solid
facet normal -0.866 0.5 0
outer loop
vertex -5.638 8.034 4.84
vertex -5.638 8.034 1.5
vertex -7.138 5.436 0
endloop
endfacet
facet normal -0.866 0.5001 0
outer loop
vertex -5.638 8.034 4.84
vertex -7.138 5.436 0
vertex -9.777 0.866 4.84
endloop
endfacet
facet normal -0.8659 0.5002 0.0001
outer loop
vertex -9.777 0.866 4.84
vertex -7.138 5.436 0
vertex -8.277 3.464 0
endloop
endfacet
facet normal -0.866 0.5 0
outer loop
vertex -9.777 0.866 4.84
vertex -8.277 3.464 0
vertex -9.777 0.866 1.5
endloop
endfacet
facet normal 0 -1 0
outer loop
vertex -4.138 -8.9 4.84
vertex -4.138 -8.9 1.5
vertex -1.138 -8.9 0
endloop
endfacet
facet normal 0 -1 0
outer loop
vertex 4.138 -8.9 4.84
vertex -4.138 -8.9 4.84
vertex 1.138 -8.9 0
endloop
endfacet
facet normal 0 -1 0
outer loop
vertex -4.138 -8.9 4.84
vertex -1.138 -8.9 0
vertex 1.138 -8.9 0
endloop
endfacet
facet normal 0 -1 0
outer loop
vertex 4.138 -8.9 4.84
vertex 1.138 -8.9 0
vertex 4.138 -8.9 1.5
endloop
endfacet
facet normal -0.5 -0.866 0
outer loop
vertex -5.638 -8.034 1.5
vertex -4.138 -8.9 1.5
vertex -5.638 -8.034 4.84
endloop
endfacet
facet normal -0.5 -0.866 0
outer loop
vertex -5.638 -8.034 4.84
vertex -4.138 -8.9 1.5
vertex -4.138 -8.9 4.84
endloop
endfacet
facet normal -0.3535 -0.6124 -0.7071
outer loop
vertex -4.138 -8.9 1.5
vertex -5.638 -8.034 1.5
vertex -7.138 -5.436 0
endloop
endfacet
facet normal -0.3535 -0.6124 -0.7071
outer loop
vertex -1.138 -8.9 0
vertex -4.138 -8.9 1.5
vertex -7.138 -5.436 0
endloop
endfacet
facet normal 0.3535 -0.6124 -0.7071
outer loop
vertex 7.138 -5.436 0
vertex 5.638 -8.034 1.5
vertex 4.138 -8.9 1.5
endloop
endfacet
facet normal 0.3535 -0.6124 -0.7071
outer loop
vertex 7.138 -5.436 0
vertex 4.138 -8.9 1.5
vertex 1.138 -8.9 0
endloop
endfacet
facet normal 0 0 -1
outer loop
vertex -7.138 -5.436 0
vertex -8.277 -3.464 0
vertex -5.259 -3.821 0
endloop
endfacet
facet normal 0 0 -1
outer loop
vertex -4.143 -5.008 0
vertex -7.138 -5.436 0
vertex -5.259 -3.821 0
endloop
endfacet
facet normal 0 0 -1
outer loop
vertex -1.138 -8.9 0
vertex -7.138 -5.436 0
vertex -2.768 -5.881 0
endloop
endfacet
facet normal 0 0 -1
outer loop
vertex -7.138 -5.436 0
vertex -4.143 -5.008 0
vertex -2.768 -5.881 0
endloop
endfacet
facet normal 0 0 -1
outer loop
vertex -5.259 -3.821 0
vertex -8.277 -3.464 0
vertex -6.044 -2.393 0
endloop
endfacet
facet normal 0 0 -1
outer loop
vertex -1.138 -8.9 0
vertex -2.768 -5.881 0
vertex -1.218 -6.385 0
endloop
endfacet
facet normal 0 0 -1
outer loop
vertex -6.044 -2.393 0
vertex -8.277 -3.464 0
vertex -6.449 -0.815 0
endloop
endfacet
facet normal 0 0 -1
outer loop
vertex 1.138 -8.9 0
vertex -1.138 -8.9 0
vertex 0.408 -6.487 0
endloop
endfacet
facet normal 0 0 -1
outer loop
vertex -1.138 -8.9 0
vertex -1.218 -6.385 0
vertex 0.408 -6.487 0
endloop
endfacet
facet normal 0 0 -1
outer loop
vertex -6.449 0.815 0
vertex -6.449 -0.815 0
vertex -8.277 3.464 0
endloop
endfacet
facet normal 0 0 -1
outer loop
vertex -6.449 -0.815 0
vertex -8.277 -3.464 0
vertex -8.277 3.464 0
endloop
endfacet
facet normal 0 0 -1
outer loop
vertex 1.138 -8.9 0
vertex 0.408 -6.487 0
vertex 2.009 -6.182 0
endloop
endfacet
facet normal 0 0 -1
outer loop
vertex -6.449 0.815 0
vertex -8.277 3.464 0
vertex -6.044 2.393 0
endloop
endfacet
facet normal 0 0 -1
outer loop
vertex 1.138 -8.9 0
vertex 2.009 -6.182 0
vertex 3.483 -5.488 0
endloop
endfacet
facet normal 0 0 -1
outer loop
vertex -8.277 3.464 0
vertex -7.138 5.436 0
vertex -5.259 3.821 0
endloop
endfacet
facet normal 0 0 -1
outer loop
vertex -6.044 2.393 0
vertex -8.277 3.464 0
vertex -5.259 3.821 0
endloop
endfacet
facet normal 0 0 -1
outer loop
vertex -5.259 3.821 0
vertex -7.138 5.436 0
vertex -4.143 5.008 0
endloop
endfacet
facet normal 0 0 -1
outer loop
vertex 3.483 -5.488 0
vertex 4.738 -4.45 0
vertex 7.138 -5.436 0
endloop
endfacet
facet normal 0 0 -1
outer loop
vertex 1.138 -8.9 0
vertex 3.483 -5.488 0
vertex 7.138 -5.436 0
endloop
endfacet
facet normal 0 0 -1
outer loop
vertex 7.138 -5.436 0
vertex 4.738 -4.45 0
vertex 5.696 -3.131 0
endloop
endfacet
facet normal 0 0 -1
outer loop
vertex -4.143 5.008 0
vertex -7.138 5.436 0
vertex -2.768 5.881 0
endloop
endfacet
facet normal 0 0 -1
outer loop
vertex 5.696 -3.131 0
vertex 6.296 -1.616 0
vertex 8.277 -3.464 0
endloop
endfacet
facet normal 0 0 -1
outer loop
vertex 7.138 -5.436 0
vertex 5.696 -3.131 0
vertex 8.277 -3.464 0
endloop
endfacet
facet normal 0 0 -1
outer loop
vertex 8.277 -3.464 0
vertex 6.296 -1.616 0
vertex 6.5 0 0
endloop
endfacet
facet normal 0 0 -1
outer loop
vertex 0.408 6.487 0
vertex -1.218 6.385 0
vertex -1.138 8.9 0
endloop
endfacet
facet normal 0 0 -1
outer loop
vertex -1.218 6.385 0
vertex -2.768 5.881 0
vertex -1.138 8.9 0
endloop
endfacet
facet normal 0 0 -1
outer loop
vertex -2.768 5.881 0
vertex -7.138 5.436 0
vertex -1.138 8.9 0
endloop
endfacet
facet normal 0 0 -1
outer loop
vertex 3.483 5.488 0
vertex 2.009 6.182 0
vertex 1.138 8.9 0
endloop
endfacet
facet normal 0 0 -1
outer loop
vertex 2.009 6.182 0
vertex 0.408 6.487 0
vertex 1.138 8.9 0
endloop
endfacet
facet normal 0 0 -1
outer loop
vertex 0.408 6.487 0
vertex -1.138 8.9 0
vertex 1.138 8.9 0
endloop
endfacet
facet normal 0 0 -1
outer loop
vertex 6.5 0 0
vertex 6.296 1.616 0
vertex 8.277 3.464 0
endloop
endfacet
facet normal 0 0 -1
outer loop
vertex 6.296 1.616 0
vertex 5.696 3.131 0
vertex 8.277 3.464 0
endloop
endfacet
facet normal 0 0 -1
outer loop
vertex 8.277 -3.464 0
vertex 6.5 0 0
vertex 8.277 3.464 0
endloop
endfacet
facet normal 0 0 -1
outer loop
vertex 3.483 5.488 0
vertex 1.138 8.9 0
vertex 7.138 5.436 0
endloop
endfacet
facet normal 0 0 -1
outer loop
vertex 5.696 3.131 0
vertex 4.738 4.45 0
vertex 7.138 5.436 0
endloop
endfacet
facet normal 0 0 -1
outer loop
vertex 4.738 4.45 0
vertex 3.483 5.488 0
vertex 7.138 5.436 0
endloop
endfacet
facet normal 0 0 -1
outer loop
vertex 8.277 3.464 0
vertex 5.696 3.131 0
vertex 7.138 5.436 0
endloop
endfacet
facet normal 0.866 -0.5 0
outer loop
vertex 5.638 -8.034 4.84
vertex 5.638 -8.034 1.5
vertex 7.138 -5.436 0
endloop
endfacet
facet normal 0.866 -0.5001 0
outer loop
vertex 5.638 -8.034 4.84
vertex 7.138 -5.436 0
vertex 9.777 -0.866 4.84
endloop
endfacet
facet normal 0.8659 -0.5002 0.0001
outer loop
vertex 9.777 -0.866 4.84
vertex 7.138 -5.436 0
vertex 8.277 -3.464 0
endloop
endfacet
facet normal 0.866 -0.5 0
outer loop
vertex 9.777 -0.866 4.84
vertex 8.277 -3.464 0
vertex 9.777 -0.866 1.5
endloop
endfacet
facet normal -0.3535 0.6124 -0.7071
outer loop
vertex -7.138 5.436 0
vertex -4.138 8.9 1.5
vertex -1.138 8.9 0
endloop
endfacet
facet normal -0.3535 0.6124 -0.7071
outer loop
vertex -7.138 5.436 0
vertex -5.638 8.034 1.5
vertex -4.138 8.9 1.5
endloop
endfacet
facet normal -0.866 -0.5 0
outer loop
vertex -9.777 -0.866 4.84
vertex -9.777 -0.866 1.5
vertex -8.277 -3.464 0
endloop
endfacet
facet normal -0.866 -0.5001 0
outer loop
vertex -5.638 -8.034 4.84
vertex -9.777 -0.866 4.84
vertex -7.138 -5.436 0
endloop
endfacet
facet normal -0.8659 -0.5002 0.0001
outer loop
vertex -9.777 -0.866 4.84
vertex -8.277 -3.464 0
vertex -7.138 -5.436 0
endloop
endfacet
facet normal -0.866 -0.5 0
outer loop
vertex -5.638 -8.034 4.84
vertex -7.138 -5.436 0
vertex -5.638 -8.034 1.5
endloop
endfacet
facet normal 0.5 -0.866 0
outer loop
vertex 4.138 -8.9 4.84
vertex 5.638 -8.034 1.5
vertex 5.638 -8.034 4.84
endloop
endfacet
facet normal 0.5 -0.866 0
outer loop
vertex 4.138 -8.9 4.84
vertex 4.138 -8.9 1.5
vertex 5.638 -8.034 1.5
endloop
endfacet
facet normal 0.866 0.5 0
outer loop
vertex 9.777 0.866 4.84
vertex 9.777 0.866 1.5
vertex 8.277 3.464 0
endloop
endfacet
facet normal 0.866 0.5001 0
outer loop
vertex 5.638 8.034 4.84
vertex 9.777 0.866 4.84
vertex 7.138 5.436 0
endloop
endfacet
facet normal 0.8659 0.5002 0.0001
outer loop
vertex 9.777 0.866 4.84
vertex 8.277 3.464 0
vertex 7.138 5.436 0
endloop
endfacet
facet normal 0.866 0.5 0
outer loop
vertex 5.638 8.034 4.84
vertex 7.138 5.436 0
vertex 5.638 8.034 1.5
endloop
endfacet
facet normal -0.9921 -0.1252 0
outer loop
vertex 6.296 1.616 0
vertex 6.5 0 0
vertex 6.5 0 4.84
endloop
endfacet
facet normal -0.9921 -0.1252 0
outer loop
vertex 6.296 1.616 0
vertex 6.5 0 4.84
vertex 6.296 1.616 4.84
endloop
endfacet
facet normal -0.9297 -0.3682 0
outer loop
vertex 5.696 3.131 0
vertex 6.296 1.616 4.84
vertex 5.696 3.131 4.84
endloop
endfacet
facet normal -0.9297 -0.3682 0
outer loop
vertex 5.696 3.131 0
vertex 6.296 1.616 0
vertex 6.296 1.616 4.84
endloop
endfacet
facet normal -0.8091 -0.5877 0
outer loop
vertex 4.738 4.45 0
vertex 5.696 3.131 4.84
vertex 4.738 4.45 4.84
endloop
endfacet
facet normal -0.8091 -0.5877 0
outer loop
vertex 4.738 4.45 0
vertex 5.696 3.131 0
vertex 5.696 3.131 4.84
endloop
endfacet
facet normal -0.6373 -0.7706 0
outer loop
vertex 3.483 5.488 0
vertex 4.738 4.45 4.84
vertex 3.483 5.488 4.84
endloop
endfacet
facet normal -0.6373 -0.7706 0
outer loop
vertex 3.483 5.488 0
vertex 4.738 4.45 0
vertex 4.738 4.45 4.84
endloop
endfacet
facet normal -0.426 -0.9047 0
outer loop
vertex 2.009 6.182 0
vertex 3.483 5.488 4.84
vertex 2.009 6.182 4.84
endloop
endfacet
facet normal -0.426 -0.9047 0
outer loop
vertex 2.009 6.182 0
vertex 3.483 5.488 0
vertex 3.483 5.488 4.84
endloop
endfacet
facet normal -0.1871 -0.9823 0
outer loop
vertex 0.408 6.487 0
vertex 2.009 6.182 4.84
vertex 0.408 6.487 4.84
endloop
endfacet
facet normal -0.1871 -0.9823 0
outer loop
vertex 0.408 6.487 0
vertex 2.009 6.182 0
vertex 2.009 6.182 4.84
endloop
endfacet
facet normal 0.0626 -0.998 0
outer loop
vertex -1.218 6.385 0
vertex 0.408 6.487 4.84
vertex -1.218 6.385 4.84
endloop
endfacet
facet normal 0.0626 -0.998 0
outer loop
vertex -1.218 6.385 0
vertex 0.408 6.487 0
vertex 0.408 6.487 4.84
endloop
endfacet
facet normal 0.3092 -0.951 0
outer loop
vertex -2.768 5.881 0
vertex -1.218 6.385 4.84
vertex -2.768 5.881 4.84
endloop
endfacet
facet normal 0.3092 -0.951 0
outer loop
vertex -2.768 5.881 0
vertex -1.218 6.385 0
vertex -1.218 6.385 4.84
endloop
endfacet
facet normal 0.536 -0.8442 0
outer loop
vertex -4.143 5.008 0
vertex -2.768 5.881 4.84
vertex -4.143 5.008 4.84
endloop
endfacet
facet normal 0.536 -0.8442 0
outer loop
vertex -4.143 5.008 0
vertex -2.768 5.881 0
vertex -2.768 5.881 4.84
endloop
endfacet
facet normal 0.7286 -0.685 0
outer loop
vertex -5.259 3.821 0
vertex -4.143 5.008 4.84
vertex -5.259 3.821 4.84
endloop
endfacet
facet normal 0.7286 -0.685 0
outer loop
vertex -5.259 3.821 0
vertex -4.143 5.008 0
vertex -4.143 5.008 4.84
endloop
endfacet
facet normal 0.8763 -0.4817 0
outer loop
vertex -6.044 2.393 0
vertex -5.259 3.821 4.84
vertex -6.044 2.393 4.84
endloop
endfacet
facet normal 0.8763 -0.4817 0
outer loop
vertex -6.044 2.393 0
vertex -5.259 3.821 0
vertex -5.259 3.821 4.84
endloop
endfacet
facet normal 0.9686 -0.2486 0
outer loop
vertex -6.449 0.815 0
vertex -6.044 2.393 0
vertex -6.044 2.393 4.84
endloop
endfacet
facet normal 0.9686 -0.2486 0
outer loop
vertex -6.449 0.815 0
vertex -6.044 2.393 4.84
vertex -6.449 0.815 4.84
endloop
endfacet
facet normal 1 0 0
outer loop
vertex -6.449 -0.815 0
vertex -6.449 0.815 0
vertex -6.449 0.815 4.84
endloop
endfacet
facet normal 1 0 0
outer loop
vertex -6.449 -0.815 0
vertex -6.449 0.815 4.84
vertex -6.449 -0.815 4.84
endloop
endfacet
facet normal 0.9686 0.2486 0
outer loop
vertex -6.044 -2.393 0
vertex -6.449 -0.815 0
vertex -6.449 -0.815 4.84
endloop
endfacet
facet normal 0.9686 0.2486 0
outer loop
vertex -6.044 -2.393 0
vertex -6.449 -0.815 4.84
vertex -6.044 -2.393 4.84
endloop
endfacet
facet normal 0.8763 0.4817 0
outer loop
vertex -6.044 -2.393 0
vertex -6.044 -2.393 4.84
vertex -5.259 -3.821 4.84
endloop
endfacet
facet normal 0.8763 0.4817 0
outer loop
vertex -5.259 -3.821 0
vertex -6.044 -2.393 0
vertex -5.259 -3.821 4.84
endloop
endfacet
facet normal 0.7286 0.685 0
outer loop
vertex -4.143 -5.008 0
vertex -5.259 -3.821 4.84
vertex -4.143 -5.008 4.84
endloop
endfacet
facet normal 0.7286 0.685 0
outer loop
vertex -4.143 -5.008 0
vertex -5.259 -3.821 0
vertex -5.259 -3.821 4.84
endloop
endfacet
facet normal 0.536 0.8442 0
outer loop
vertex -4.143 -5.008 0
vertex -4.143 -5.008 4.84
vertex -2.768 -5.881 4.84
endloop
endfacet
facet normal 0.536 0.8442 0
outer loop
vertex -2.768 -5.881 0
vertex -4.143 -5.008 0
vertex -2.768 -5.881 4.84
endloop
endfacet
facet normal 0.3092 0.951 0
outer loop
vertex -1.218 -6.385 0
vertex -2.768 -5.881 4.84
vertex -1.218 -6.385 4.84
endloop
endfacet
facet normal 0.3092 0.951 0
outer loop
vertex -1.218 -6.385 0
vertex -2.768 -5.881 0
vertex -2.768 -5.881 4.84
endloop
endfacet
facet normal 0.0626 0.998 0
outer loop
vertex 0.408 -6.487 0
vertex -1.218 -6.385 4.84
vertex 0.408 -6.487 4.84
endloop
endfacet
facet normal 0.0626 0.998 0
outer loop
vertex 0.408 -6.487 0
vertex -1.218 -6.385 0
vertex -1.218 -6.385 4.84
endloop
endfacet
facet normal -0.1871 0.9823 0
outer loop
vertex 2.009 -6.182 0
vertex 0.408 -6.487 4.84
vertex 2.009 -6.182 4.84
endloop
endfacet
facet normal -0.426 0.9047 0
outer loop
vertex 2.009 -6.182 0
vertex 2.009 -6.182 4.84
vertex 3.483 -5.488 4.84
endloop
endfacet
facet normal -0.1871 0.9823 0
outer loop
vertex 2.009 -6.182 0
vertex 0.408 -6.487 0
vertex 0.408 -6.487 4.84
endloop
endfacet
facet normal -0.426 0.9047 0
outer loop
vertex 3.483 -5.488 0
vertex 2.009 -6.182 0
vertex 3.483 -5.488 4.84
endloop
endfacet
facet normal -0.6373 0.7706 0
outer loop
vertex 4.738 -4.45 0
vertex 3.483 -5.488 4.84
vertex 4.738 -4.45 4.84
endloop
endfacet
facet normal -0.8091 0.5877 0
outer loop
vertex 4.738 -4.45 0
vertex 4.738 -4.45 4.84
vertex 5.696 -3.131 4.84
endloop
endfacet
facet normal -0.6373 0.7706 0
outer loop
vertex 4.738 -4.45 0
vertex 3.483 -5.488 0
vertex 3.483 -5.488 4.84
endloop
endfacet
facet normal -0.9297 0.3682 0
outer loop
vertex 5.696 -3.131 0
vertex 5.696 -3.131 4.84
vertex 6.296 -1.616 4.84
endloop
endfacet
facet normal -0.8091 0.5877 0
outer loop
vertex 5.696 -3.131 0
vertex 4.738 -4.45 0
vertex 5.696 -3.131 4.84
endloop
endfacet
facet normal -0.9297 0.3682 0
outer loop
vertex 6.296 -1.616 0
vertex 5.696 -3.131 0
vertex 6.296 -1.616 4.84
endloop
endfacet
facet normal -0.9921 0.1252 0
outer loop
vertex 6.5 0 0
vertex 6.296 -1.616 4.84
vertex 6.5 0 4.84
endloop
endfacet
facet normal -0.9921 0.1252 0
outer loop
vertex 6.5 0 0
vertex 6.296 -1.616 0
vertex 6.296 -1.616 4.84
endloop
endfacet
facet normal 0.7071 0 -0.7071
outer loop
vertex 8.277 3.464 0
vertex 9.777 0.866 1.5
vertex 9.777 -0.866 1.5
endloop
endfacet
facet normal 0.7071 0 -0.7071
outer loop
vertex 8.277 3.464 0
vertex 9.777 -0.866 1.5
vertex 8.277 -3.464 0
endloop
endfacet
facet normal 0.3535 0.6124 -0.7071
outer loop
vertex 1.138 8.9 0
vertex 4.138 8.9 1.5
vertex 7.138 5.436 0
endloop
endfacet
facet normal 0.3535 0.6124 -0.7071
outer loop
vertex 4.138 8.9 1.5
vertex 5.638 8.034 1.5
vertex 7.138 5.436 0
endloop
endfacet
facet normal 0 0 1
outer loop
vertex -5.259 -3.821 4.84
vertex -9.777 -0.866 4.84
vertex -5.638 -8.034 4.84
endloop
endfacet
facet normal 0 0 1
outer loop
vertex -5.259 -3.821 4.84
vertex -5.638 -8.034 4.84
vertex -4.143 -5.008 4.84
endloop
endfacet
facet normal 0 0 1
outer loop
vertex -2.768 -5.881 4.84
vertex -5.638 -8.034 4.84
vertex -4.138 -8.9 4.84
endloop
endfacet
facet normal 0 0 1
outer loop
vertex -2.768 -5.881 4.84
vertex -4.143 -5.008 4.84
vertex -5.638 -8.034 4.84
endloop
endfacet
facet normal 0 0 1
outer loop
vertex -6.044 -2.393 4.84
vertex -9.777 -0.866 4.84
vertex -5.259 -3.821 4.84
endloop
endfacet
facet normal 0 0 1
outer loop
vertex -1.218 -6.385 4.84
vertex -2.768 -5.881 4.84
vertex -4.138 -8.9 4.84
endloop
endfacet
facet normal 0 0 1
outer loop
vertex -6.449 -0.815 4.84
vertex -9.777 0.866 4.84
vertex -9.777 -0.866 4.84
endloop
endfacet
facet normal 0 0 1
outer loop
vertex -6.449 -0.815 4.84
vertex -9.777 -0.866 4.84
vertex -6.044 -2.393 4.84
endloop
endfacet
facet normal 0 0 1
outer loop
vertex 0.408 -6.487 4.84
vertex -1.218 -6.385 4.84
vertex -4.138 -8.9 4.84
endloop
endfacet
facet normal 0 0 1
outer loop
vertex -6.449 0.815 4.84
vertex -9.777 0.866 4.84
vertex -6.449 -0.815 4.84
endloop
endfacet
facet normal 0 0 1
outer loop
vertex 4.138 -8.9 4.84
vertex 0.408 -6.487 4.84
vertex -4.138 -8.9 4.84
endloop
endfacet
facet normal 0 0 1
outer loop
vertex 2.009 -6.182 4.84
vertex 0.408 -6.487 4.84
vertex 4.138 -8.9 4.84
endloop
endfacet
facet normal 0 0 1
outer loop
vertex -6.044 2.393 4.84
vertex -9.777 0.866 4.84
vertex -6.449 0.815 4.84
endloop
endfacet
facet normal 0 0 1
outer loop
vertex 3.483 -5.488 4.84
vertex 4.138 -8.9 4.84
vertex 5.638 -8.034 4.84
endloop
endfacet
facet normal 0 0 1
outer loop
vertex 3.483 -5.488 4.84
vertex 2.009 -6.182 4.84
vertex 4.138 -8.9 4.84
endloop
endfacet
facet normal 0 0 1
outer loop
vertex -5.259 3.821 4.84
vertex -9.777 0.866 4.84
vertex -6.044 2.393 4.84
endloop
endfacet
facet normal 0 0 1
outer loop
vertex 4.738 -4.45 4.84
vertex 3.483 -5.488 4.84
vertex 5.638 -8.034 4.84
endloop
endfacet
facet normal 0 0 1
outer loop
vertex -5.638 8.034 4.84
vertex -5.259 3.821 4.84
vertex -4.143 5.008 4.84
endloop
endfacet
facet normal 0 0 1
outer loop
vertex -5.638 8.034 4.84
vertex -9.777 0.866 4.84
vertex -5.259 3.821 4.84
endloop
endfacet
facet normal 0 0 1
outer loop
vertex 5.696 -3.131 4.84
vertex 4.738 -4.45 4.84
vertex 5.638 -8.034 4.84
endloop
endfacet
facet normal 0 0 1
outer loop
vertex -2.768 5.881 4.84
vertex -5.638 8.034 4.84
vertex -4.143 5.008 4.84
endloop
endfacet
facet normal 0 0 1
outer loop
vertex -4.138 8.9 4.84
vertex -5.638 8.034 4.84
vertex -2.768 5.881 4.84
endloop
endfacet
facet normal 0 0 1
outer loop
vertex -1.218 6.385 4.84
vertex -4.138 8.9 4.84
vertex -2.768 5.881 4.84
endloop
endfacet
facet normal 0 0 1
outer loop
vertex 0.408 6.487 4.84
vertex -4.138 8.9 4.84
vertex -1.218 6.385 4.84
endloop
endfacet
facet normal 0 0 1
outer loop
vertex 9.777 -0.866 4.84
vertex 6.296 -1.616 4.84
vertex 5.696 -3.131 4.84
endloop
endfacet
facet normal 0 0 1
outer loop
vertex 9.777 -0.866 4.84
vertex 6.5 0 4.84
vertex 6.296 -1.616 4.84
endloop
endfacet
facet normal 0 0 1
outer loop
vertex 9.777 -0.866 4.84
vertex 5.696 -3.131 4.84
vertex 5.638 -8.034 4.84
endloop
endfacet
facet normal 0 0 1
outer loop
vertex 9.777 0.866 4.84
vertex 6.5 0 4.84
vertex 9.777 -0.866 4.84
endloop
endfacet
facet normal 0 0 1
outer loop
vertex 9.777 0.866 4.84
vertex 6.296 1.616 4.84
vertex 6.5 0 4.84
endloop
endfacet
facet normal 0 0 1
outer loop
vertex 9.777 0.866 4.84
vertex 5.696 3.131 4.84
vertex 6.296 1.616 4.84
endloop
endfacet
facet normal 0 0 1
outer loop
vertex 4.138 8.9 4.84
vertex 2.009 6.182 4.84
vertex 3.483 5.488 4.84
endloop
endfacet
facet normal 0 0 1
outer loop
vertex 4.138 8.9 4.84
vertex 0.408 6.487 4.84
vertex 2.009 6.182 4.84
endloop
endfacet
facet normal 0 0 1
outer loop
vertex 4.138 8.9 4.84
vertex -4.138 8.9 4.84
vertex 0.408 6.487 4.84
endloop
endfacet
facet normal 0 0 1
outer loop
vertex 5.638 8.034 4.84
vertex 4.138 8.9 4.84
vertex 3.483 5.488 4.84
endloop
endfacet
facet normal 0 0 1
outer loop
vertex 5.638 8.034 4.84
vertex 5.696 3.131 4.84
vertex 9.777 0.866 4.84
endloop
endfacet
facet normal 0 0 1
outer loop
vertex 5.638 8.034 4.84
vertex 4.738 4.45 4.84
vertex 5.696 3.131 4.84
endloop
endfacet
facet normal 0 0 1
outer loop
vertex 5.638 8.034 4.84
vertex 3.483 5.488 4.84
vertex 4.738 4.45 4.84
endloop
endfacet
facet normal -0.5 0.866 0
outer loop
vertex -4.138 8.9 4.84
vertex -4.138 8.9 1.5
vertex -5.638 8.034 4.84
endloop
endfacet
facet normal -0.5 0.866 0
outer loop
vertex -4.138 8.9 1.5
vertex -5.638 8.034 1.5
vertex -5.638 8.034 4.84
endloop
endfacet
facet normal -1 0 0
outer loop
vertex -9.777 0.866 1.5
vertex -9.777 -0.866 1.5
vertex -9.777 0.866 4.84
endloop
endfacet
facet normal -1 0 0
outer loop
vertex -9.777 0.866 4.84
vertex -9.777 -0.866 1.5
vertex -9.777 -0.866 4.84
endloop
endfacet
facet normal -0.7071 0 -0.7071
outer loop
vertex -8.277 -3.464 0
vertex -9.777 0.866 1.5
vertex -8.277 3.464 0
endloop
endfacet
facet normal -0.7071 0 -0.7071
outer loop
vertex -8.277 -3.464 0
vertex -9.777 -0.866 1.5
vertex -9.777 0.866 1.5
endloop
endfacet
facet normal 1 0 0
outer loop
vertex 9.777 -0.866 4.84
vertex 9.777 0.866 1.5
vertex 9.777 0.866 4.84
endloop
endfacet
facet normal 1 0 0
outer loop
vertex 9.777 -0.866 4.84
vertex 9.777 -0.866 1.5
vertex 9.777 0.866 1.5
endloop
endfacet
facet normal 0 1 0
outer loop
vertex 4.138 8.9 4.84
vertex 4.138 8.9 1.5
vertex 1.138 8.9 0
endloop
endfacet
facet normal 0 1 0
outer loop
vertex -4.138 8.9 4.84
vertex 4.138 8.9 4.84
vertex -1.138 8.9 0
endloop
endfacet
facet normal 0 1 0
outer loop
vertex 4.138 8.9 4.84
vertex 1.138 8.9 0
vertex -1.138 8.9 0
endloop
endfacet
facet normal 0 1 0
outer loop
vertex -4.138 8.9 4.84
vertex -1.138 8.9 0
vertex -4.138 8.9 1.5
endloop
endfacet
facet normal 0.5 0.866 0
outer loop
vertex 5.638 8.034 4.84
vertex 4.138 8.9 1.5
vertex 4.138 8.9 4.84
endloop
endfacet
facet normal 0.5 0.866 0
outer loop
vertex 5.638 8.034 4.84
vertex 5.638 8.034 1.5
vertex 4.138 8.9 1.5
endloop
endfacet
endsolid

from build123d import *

# Parameters (mm, degrees)
SKETCH1_R           = 6.5
BOSS_EXTRUDE1_DEPTH = 4.84
CHAMFER1_SIZE       = 1
CHAMFER2_SIZE       = 1.5


with BuildPart() as part:
    # Sketch1 → Boss-Extrude1 (new body)
    with BuildSketch(Plane.XY):
        Polygon((5.138417396, 8.9), (-5.138417396, 8.9), (-10.276834792, 0), (-5.138417396, -8.9), (5.138417396, -8.9), (10.276834792, 0), align=None)
        Circle(SKETCH1_R, mode=Mode.SUBTRACT)
    extrude(amount=BOSS_EXTRUDE1_DEPTH)

    # Chamfer1
    chamfer1_edges = [part.edges().sort_by_distance(p)[0] for p in [
        (10.276834792, 0, 2.42),
        (5.138417396, -8.9, 2.42),
        (-5.138417396, -8.9, 2.42),
        (-10.276834792, 0, 2.42),
        (-5.138417396, 8.9, 2.42),
        (5.138417396, 8.9, 2.42),
    ]]
    chamfer(chamfer1_edges, length=CHAMFER1_SIZE)

    # Chamfer2
    chamfer2_edges = [part.edges().sort_by_distance(p)[0] for p in [
        (4.888417396, 8.466987298, 0),
        (9.776834792, 0, 0),
        (-4.888417396, 8.466987298, 0),
        (-9.776834792, 0, 0),
        (-4.888417396, -8.466987298, 0),
        (4.888417396, -8.466987298, 0),
    ]]
    chamfer(chamfer2_edges, length=CHAMFER2_SIZE)


solid = part.part
